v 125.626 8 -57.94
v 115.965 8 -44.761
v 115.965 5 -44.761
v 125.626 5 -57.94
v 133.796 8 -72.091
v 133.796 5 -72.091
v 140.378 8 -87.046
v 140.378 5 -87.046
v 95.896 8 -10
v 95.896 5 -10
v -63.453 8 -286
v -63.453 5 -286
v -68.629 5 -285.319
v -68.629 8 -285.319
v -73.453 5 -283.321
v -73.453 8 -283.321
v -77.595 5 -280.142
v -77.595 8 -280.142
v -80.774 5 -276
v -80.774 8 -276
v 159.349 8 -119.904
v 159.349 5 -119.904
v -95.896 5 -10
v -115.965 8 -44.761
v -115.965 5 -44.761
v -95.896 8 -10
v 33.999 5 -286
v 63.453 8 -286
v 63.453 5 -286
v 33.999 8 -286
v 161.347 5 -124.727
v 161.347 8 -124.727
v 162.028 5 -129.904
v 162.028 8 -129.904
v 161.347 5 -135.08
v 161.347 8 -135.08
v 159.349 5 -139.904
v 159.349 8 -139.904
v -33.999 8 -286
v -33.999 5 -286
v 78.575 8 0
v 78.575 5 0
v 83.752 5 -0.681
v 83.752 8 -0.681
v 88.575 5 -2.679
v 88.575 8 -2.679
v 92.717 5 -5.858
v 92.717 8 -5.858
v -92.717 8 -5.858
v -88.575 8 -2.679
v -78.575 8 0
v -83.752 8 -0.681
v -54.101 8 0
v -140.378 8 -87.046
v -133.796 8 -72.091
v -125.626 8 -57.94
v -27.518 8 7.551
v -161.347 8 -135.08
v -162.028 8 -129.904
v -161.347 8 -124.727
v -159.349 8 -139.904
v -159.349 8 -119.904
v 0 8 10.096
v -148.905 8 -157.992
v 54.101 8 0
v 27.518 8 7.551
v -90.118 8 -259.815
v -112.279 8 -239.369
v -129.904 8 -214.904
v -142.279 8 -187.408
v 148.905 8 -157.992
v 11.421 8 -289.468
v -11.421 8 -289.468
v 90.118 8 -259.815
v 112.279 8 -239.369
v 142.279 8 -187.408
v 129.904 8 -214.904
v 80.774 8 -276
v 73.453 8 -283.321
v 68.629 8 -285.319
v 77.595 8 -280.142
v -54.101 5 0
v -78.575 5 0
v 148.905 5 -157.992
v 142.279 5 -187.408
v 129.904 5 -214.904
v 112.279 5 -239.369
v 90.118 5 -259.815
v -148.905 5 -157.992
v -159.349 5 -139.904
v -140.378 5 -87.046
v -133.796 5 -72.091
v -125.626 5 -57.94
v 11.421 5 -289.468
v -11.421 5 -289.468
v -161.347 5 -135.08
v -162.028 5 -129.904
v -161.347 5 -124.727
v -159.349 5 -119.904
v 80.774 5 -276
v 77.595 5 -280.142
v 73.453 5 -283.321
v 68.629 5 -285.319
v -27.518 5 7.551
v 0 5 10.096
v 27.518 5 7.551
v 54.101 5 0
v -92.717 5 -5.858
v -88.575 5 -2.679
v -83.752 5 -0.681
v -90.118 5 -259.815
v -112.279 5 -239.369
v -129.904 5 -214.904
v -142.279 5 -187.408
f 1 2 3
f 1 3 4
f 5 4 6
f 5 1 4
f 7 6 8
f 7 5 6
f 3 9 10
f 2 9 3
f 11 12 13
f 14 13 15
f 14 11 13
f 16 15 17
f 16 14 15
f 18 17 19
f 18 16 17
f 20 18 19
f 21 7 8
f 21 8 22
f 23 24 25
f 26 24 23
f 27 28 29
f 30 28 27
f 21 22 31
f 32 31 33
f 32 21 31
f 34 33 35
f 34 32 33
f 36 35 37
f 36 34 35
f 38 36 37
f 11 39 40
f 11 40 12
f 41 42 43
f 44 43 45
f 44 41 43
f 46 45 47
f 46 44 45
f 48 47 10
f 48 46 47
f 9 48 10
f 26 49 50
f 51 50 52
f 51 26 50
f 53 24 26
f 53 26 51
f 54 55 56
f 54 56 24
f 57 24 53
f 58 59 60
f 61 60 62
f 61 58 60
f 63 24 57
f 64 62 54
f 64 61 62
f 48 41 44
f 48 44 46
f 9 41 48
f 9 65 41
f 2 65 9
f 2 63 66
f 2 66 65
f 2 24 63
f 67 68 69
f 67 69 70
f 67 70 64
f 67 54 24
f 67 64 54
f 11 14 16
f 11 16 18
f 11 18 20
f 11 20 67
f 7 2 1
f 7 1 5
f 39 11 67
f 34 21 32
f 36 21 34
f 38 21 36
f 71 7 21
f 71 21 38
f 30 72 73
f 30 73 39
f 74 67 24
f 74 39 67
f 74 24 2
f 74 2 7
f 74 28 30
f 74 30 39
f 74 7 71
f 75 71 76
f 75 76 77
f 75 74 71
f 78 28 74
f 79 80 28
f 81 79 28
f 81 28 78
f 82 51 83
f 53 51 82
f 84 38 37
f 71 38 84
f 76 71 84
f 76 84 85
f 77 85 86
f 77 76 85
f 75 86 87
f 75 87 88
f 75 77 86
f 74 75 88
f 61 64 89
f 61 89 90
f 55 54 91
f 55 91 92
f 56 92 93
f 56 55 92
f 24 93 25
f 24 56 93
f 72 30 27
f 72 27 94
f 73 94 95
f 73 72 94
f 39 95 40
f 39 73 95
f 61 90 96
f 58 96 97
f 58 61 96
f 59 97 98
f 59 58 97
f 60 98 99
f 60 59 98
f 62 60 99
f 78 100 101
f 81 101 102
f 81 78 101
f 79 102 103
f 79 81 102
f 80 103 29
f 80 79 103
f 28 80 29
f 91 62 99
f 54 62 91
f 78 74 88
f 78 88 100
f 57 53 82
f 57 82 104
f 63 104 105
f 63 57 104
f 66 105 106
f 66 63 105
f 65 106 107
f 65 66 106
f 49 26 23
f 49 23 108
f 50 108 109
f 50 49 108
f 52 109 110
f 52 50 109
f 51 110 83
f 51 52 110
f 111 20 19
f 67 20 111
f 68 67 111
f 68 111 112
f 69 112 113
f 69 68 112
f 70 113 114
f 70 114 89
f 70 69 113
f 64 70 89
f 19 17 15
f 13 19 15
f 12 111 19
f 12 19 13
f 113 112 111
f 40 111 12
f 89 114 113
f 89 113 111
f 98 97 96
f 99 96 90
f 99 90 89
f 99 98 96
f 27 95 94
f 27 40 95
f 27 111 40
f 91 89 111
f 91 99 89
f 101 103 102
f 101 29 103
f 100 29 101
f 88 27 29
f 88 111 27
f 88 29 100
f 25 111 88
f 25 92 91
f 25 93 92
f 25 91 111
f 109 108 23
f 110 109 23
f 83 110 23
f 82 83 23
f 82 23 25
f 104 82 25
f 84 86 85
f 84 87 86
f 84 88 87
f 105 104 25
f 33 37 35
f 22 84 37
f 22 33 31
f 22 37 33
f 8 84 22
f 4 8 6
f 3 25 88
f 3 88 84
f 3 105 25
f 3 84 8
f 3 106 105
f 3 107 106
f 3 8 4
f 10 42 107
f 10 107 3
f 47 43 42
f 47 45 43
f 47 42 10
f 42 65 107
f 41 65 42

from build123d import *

# Parameters (mm, degrees)
EXTRUDE_1_DEPTH     = 5
FILLET_1_R          = 20
EXTRUDE_START       = 3
EXTRUDE_2_DEPTH     = 3
SKETCH_5_W          = 424.898907654
SKETCH_5_H          = 342.867142677
CUT_EXTRUDE_2_DEPTH = 13


with BuildPart() as part:
    # 草圖1 → 填料-伸長1 (new body)
    with BuildSketch(Plane(origin=(0, 0, 0), x_dir=(1, 0, 0), z_dir=(0, 1, 0))):
        Polygon((-90.122176988, 0), (90.122176988, 0), (165.122176988, 129.903810568), (75, 286), (-75, 286), (-165.122176988, 129.903810568), align=None)
    extrude(amount=EXTRUDE_1_DEPTH)

    # 圓角1
    fillet_1_edges = [part.edges().sort_by_distance(p)[0] for p in [
        (-165.122176988, 2.5, -129.903810568),
        (-75, 2.5, -286),
        (75, 2.5, -286),
        (165.122176988, 2.5, -129.903810568),
        (90.122176988, 2.5, 0),
        (-90.122176988, 2.5, 0),
    ]]
    fillet(fillet_1_edges, radius=FILLET_1_R)

    # 草圖3 → 填料-伸長2 (add)
    with BuildSketch(Plane(origin=(0, 5, 0), x_dir=(1, 0, 0), z_dir=(0, 1, 0)).offset(EXTRUDE_START)):
        with BuildLine():
            Line((-159.348674296, 119.903810568), (-140.378315376, 87.04618508))
            ThreePointArc((-140.378315376, 87.04618508), (-129.903810568, 64.903810568), (-115.965204144, 44.761436056))
            Line((-115.965204144, 44.761436056), (-95.89567968, 10))
            ThreePointArc((-95.89567968, 10), (-88.575171604, 2.679491924), (-78.575171604, 0))
            Line((-78.575171604, 0), (-54.101051641, 0))
            ThreePointArc((-54.101051641, 0), (0, -10.096189432), (54.101051641, 0))
            Line((54.101051641, 0), (78.575171604, 0))
            ThreePointArc((78.575171604, 0), (88.575171604, 2.679491924), (95.89567968, 10))
            Line((95.89567968, 10), (115.965204144, 44.761436056))
            ThreePointArc((115.965204144, 44.761436056), (129.903810568, 64.903810568), (140.378315376, 87.04618508))
            Line((140.378315376, 87.04618508), (159.348674296, 119.903810568))
            ThreePointArc((159.348674296, 119.903810568), (162.028166221, 129.903810568), (159.348674296, 139.903810568))
            Line((159.348674296, 139.903810568), (148.905382636, 157.992122322))
            ThreePointArc((148.905382636, 157.992122322), (129.903810568, 214.903810568), (90.117628809, 259.815498813))
            Line((90.117628809, 259.815498813), (80.773502692, 276))
            ThreePointArc((80.773502692, 276), (73.452994616, 283.320508076), (63.452994616, 286))
            Line((63.452994616, 286), (33.998579873, 286))
            ThreePointArc((33.998579873, 286), (0, 289.903810568), (-33.998579873, 286))
            Line((-33.998579873, 286), (-63.452994616, 286))
            ThreePointArc((-63.452994616, 286), (-73.452994616, 283.320508076), (-80.773502692, 276))
            Line((-80.773502692, 276), (-90.117628809, 259.815498813))
            ThreePointArc((-90.117628809, 259.815498813), (-129.903810568, 214.903810568), (-148.905382636, 157.992122322))
            Line((-148.905382636, 157.992122322), (-159.348674296, 139.903810568))
            ThreePointArc((-159.348674296, 139.903810568), (-162.028166221, 129.903810568), (-159.348674296, 119.903810568))
        make_face()
    extrude(amount=-EXTRUDE_2_DEPTH)

    # 草圖5 → 除料-伸長2 (cut)
    with BuildSketch(Plane.XZ.offset(-5)):
        with Locations((0.961309746, -138.62206424)):
            Rectangle(SKETCH_5_W, SKETCH_5_H)
    extrude(amount=CUT_EXTRUDE_2_DEPTH, mode=Mode.SUBTRACT)


solid = part.part
